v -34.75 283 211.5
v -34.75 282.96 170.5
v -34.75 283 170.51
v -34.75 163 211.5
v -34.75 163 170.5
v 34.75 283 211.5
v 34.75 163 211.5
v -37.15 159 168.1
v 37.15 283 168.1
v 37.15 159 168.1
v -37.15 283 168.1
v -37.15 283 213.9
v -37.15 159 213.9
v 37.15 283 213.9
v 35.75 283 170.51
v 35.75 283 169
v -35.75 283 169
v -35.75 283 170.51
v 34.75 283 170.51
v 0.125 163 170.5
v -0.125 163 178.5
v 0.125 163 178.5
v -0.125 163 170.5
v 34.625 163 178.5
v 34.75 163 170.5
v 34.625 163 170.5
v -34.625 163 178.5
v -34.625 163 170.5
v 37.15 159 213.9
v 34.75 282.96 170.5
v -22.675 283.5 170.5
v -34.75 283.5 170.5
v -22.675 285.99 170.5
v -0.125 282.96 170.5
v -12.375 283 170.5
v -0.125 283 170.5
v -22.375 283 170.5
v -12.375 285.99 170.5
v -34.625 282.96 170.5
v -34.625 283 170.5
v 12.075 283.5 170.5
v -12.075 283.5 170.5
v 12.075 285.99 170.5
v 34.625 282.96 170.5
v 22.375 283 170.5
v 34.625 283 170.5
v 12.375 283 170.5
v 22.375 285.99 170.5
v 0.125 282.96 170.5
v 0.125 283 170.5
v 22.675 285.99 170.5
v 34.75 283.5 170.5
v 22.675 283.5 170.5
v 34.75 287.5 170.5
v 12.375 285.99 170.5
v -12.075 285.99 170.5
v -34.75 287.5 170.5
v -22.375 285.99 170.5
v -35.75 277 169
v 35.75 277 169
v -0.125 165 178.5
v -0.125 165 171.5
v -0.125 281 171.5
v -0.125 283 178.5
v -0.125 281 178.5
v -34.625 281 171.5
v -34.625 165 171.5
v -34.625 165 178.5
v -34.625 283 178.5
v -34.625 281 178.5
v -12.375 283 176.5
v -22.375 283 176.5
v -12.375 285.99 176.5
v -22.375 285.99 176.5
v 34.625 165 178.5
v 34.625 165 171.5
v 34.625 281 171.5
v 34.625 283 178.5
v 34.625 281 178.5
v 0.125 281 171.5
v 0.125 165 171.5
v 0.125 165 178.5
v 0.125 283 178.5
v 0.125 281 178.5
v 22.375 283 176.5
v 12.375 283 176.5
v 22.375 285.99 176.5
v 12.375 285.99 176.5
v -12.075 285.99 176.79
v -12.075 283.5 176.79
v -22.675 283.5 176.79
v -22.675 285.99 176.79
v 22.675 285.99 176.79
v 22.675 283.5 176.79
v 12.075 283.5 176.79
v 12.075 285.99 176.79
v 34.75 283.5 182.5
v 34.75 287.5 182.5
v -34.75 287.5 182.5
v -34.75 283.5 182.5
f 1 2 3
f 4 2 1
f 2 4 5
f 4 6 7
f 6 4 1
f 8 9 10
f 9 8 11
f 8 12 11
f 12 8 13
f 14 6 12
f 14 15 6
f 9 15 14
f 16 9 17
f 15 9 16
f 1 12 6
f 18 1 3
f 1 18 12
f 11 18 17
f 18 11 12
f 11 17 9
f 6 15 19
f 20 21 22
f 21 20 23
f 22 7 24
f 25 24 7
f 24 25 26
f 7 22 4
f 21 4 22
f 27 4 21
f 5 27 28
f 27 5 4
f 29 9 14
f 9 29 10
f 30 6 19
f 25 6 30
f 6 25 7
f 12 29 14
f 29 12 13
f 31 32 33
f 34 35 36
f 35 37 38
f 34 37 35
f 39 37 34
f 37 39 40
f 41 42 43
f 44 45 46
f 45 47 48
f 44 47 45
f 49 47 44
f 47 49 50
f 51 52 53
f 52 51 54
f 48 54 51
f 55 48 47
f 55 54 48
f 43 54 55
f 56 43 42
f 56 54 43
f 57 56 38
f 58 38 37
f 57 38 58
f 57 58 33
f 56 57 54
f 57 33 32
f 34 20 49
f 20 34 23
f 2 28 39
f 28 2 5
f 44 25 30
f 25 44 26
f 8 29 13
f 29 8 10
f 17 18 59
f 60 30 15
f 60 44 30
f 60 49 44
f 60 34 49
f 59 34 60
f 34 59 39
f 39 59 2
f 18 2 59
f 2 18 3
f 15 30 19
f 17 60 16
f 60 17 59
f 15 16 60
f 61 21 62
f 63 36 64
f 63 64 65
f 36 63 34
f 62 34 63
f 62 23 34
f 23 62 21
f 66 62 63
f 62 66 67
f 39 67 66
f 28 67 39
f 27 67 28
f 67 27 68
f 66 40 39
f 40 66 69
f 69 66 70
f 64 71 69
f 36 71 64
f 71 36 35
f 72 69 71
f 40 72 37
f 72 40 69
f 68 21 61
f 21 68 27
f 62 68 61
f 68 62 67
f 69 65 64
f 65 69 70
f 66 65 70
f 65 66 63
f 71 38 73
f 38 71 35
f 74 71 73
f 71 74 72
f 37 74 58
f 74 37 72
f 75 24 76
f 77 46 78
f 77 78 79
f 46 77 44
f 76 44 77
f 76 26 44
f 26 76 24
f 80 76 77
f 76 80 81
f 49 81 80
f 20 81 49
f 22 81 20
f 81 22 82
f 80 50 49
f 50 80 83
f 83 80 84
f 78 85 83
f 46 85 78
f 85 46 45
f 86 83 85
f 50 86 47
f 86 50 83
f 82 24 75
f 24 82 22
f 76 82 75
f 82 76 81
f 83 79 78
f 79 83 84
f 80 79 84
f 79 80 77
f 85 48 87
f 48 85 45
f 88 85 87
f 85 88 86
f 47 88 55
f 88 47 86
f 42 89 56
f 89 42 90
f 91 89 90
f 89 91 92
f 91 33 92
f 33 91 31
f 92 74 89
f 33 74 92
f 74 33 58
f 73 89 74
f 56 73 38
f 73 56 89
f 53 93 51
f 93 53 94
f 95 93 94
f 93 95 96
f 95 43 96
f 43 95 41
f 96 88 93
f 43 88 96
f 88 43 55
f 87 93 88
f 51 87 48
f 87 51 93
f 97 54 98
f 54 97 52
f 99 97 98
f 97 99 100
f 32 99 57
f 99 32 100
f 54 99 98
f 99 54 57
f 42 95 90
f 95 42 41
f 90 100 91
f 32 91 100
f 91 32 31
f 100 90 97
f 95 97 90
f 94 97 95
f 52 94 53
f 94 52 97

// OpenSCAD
// file: twin_pack_tray_params.scad
// GENERATED by tools/twin_head_pack_fit.py -- do not edit by hand.
// Aircraft datum R2, mm.  License: CERN-OHL-W-2.0
CELL_L = 116.0000;
CELL_W = 38.5000;
CELL_H = 34.0000;
LAT = 0.7500;
VERT = 1.2500;
LANE_W = 35.5000;
TRAY_W = 69.5000;
TRAY_H = 41.0000;
TRAY_ZC = 191.0000;
TRAY_Y0 = 163.0000;
TRAY_Y1 = 283.0000;
STOP_T = 4.0000;
LANE_X = 17.3750;
RAIL_T = 2.4000;
CORRIDOR_ZC = 189.5000;
SLED_FLOOR_T = 1.0000;
SLED_LIP = 2.0000;
// main file
// twin_pack_tray.scad -- twin flat battery tray, sleds and aft gate for two
// Tattu R-Line 6S 2200 packs forward of the thrust line in the one-piece
// head+cargo hull (plan 003 R10; tools/twin_head_pack_fit.py proves the fit,
// tools/merge_head_cargo_shell.py builds the hull).  Replaces the single head
// cell rail / sled / catch (tools/gen_head_cell_rail.py) and the cargo
// battery cradle.
//
// Aircraft datum R2 (X port+, Y aft+, Z up), mm.  Parameters are GENERATED:
//     /usr/bin/python3 tools/twin_head_pack_fit.py
//
// Parts (select with PART):
//   "tray"  -- inverted box: ceiling, side walls (bonded to the skin, the
//              gate reports <= 52 mm^3 skin seat), FULL floor (the packs step
//              sideways into their lanes, so edge lips cannot carry them), and
//              the forward stop plate.  Open aft for loading.  A 1.5 mm
//              chamfered ramp at the aft floor edge takes the sled up from the
//              corridor (Zc 189.5) to the tray floor (Zc 191).
//   "sled"  -- one per pack: 1 mm pan + 2 mm nose / tail lips, a tail tab
//              that keys into the gate.
//   "gate"  -- hinged aft bar across both lanes with a pocket per sled tail
//              tab: holds both sleds forward against the stop AND laterally
//              in their lanes.  Hinge on the stbd wall, latch on the port
//              wall (latch hardware per docs/BATTERY_MOUNT.md §8 statics,
//              re-run for 2 x 321 g -- OPEN item).
//   "assy"  -- all of the above in place, packs shown as ghost boxes.
//
// Material: SLS DuraForm PA CF (docs/SLS_MATERIAL_SELECTION_3DSYSTEMS.md).
//
// Author:  Steve Griffing, PE(CSE), CISSP-ISSEP, CPP
// AI note: Written by Claude (model: Claude Opus 5.5, Anthropic) under the
// author's direction, 2026-10-31, per AGENTS.md §3 AI attribution.
// License: CERN-OHL-W-2.0 — see LICENSES/CERN-OHL-W 2.0
// (SPDX-License-Identifier: CERN-OHL-W-2.0)

include <twin_pack_tray_params.scad>

PART = "assy";
$fn = 32;

Z0 = TRAY_ZC - TRAY_H / 2;     // band floor
Z1 = TRAY_ZC + TRAY_H / 2;     // band ceiling
HW = TRAY_W / 2;
RAMP = TRAY_ZC - CORRIDOR_ZC;  // 1.5 mm step from the corridor
GATE_T = 4.0;
TAB_W = 10.0;
TAB_L = 3.0;
TAB_H = 6.0;
SLED_CLR = 0.5;                // sled to lane wall / neighbour, per side

module tray() {
    difference() {
        union() {
            // ceiling
            translate([-HW - RAIL_T, TRAY_Y0, Z1]) cube([TRAY_W + 2 * RAIL_T, TRAY_Y1 - TRAY_Y0, RAIL_T]);
            // side walls
            for (s = [-1, 1])
                translate([s > 0 ? HW : -HW - RAIL_T, TRAY_Y0, Z0 - RAIL_T])
                    cube([RAIL_T, TRAY_Y1 - TRAY_Y0, TRAY_H + RAIL_T]);
            // full floor
            translate([-HW, TRAY_Y0, Z0 - RAIL_T]) cube([TRAY_W, TRAY_Y1 - TRAY_Y0, RAIL_T]);
            // forward stop plate
            translate([-HW - RAIL_T, TRAY_Y0 - STOP_T, Z0 - RAIL_T])
                cube([TRAY_W + 2 * RAIL_T, STOP_T, TRAY_H + 2 * RAIL_T]);
        }
        // aft entry ramp: chamfer the floor's aft edge down to the corridor floor
        translate([-HW - 1, TRAY_Y1, Z0 - RAMP])
            rotate([0, 90, 0]) linear_extrude(TRAY_W + 2)
                polygon([[0, 0], [-RAMP - 0.01, 0], [0, -6]]);
    }
}

module sled() {
    // local: lane centred on X 0, Y from the stop face
    w = LANE_W - 2 * SLED_CLR;
    L = CELL_L + 2 * SLED_LIP;
    translate([-w / 2, 0, 0]) {
        cube([w, L, SLED_FLOOR_T]);                       // pan
        cube([w, SLED_LIP, 8]);                           // nose lip
        translate([0, L - SLED_LIP, 0]) cube([w, SLED_LIP, 8]);  // tail lip
        translate([w / 2 - TAB_W / 2, L, 0]) cube([TAB_W, TAB_L, TAB_H]);  // gate tab
    }
}

module gate() {
    difference() {
        translate([-HW, 0, 0]) cube([TRAY_W, GATE_T, TAB_H + 6]);
        for (s = [-1, 1])
            translate([s * LANE_X - TAB_W / 2 - 0.3, -0.01, -0.01])
                cube([TAB_W + 0.6, TAB_L - 0.5, TAB_H + 0.3]);
    }
}

module placed_sleds() {
    for (s = [-1, 1])
        translate([s * LANE_X, TRAY_Y0, Z0]) sled();
}

module placed_gate() {
    translate([0, TRAY_Y0 + CELL_L + 2 * SLED_LIP + TAB_L - (TAB_L - 0.5), Z0]) gate();
}

if (PART == "tray") tray();
else if (PART == "sled") sled();
else if (PART == "gate") gate();
else {
    tray();
    placed_sleds();
    placed_gate();
    for (s = [-1, 1])
        %translate([s * LANE_X - CELL_H / 2, TRAY_Y0 + SLED_LIP, Z0 + SLED_FLOOR_T])
            cube([CELL_H, CELL_L, CELL_W]);
}
